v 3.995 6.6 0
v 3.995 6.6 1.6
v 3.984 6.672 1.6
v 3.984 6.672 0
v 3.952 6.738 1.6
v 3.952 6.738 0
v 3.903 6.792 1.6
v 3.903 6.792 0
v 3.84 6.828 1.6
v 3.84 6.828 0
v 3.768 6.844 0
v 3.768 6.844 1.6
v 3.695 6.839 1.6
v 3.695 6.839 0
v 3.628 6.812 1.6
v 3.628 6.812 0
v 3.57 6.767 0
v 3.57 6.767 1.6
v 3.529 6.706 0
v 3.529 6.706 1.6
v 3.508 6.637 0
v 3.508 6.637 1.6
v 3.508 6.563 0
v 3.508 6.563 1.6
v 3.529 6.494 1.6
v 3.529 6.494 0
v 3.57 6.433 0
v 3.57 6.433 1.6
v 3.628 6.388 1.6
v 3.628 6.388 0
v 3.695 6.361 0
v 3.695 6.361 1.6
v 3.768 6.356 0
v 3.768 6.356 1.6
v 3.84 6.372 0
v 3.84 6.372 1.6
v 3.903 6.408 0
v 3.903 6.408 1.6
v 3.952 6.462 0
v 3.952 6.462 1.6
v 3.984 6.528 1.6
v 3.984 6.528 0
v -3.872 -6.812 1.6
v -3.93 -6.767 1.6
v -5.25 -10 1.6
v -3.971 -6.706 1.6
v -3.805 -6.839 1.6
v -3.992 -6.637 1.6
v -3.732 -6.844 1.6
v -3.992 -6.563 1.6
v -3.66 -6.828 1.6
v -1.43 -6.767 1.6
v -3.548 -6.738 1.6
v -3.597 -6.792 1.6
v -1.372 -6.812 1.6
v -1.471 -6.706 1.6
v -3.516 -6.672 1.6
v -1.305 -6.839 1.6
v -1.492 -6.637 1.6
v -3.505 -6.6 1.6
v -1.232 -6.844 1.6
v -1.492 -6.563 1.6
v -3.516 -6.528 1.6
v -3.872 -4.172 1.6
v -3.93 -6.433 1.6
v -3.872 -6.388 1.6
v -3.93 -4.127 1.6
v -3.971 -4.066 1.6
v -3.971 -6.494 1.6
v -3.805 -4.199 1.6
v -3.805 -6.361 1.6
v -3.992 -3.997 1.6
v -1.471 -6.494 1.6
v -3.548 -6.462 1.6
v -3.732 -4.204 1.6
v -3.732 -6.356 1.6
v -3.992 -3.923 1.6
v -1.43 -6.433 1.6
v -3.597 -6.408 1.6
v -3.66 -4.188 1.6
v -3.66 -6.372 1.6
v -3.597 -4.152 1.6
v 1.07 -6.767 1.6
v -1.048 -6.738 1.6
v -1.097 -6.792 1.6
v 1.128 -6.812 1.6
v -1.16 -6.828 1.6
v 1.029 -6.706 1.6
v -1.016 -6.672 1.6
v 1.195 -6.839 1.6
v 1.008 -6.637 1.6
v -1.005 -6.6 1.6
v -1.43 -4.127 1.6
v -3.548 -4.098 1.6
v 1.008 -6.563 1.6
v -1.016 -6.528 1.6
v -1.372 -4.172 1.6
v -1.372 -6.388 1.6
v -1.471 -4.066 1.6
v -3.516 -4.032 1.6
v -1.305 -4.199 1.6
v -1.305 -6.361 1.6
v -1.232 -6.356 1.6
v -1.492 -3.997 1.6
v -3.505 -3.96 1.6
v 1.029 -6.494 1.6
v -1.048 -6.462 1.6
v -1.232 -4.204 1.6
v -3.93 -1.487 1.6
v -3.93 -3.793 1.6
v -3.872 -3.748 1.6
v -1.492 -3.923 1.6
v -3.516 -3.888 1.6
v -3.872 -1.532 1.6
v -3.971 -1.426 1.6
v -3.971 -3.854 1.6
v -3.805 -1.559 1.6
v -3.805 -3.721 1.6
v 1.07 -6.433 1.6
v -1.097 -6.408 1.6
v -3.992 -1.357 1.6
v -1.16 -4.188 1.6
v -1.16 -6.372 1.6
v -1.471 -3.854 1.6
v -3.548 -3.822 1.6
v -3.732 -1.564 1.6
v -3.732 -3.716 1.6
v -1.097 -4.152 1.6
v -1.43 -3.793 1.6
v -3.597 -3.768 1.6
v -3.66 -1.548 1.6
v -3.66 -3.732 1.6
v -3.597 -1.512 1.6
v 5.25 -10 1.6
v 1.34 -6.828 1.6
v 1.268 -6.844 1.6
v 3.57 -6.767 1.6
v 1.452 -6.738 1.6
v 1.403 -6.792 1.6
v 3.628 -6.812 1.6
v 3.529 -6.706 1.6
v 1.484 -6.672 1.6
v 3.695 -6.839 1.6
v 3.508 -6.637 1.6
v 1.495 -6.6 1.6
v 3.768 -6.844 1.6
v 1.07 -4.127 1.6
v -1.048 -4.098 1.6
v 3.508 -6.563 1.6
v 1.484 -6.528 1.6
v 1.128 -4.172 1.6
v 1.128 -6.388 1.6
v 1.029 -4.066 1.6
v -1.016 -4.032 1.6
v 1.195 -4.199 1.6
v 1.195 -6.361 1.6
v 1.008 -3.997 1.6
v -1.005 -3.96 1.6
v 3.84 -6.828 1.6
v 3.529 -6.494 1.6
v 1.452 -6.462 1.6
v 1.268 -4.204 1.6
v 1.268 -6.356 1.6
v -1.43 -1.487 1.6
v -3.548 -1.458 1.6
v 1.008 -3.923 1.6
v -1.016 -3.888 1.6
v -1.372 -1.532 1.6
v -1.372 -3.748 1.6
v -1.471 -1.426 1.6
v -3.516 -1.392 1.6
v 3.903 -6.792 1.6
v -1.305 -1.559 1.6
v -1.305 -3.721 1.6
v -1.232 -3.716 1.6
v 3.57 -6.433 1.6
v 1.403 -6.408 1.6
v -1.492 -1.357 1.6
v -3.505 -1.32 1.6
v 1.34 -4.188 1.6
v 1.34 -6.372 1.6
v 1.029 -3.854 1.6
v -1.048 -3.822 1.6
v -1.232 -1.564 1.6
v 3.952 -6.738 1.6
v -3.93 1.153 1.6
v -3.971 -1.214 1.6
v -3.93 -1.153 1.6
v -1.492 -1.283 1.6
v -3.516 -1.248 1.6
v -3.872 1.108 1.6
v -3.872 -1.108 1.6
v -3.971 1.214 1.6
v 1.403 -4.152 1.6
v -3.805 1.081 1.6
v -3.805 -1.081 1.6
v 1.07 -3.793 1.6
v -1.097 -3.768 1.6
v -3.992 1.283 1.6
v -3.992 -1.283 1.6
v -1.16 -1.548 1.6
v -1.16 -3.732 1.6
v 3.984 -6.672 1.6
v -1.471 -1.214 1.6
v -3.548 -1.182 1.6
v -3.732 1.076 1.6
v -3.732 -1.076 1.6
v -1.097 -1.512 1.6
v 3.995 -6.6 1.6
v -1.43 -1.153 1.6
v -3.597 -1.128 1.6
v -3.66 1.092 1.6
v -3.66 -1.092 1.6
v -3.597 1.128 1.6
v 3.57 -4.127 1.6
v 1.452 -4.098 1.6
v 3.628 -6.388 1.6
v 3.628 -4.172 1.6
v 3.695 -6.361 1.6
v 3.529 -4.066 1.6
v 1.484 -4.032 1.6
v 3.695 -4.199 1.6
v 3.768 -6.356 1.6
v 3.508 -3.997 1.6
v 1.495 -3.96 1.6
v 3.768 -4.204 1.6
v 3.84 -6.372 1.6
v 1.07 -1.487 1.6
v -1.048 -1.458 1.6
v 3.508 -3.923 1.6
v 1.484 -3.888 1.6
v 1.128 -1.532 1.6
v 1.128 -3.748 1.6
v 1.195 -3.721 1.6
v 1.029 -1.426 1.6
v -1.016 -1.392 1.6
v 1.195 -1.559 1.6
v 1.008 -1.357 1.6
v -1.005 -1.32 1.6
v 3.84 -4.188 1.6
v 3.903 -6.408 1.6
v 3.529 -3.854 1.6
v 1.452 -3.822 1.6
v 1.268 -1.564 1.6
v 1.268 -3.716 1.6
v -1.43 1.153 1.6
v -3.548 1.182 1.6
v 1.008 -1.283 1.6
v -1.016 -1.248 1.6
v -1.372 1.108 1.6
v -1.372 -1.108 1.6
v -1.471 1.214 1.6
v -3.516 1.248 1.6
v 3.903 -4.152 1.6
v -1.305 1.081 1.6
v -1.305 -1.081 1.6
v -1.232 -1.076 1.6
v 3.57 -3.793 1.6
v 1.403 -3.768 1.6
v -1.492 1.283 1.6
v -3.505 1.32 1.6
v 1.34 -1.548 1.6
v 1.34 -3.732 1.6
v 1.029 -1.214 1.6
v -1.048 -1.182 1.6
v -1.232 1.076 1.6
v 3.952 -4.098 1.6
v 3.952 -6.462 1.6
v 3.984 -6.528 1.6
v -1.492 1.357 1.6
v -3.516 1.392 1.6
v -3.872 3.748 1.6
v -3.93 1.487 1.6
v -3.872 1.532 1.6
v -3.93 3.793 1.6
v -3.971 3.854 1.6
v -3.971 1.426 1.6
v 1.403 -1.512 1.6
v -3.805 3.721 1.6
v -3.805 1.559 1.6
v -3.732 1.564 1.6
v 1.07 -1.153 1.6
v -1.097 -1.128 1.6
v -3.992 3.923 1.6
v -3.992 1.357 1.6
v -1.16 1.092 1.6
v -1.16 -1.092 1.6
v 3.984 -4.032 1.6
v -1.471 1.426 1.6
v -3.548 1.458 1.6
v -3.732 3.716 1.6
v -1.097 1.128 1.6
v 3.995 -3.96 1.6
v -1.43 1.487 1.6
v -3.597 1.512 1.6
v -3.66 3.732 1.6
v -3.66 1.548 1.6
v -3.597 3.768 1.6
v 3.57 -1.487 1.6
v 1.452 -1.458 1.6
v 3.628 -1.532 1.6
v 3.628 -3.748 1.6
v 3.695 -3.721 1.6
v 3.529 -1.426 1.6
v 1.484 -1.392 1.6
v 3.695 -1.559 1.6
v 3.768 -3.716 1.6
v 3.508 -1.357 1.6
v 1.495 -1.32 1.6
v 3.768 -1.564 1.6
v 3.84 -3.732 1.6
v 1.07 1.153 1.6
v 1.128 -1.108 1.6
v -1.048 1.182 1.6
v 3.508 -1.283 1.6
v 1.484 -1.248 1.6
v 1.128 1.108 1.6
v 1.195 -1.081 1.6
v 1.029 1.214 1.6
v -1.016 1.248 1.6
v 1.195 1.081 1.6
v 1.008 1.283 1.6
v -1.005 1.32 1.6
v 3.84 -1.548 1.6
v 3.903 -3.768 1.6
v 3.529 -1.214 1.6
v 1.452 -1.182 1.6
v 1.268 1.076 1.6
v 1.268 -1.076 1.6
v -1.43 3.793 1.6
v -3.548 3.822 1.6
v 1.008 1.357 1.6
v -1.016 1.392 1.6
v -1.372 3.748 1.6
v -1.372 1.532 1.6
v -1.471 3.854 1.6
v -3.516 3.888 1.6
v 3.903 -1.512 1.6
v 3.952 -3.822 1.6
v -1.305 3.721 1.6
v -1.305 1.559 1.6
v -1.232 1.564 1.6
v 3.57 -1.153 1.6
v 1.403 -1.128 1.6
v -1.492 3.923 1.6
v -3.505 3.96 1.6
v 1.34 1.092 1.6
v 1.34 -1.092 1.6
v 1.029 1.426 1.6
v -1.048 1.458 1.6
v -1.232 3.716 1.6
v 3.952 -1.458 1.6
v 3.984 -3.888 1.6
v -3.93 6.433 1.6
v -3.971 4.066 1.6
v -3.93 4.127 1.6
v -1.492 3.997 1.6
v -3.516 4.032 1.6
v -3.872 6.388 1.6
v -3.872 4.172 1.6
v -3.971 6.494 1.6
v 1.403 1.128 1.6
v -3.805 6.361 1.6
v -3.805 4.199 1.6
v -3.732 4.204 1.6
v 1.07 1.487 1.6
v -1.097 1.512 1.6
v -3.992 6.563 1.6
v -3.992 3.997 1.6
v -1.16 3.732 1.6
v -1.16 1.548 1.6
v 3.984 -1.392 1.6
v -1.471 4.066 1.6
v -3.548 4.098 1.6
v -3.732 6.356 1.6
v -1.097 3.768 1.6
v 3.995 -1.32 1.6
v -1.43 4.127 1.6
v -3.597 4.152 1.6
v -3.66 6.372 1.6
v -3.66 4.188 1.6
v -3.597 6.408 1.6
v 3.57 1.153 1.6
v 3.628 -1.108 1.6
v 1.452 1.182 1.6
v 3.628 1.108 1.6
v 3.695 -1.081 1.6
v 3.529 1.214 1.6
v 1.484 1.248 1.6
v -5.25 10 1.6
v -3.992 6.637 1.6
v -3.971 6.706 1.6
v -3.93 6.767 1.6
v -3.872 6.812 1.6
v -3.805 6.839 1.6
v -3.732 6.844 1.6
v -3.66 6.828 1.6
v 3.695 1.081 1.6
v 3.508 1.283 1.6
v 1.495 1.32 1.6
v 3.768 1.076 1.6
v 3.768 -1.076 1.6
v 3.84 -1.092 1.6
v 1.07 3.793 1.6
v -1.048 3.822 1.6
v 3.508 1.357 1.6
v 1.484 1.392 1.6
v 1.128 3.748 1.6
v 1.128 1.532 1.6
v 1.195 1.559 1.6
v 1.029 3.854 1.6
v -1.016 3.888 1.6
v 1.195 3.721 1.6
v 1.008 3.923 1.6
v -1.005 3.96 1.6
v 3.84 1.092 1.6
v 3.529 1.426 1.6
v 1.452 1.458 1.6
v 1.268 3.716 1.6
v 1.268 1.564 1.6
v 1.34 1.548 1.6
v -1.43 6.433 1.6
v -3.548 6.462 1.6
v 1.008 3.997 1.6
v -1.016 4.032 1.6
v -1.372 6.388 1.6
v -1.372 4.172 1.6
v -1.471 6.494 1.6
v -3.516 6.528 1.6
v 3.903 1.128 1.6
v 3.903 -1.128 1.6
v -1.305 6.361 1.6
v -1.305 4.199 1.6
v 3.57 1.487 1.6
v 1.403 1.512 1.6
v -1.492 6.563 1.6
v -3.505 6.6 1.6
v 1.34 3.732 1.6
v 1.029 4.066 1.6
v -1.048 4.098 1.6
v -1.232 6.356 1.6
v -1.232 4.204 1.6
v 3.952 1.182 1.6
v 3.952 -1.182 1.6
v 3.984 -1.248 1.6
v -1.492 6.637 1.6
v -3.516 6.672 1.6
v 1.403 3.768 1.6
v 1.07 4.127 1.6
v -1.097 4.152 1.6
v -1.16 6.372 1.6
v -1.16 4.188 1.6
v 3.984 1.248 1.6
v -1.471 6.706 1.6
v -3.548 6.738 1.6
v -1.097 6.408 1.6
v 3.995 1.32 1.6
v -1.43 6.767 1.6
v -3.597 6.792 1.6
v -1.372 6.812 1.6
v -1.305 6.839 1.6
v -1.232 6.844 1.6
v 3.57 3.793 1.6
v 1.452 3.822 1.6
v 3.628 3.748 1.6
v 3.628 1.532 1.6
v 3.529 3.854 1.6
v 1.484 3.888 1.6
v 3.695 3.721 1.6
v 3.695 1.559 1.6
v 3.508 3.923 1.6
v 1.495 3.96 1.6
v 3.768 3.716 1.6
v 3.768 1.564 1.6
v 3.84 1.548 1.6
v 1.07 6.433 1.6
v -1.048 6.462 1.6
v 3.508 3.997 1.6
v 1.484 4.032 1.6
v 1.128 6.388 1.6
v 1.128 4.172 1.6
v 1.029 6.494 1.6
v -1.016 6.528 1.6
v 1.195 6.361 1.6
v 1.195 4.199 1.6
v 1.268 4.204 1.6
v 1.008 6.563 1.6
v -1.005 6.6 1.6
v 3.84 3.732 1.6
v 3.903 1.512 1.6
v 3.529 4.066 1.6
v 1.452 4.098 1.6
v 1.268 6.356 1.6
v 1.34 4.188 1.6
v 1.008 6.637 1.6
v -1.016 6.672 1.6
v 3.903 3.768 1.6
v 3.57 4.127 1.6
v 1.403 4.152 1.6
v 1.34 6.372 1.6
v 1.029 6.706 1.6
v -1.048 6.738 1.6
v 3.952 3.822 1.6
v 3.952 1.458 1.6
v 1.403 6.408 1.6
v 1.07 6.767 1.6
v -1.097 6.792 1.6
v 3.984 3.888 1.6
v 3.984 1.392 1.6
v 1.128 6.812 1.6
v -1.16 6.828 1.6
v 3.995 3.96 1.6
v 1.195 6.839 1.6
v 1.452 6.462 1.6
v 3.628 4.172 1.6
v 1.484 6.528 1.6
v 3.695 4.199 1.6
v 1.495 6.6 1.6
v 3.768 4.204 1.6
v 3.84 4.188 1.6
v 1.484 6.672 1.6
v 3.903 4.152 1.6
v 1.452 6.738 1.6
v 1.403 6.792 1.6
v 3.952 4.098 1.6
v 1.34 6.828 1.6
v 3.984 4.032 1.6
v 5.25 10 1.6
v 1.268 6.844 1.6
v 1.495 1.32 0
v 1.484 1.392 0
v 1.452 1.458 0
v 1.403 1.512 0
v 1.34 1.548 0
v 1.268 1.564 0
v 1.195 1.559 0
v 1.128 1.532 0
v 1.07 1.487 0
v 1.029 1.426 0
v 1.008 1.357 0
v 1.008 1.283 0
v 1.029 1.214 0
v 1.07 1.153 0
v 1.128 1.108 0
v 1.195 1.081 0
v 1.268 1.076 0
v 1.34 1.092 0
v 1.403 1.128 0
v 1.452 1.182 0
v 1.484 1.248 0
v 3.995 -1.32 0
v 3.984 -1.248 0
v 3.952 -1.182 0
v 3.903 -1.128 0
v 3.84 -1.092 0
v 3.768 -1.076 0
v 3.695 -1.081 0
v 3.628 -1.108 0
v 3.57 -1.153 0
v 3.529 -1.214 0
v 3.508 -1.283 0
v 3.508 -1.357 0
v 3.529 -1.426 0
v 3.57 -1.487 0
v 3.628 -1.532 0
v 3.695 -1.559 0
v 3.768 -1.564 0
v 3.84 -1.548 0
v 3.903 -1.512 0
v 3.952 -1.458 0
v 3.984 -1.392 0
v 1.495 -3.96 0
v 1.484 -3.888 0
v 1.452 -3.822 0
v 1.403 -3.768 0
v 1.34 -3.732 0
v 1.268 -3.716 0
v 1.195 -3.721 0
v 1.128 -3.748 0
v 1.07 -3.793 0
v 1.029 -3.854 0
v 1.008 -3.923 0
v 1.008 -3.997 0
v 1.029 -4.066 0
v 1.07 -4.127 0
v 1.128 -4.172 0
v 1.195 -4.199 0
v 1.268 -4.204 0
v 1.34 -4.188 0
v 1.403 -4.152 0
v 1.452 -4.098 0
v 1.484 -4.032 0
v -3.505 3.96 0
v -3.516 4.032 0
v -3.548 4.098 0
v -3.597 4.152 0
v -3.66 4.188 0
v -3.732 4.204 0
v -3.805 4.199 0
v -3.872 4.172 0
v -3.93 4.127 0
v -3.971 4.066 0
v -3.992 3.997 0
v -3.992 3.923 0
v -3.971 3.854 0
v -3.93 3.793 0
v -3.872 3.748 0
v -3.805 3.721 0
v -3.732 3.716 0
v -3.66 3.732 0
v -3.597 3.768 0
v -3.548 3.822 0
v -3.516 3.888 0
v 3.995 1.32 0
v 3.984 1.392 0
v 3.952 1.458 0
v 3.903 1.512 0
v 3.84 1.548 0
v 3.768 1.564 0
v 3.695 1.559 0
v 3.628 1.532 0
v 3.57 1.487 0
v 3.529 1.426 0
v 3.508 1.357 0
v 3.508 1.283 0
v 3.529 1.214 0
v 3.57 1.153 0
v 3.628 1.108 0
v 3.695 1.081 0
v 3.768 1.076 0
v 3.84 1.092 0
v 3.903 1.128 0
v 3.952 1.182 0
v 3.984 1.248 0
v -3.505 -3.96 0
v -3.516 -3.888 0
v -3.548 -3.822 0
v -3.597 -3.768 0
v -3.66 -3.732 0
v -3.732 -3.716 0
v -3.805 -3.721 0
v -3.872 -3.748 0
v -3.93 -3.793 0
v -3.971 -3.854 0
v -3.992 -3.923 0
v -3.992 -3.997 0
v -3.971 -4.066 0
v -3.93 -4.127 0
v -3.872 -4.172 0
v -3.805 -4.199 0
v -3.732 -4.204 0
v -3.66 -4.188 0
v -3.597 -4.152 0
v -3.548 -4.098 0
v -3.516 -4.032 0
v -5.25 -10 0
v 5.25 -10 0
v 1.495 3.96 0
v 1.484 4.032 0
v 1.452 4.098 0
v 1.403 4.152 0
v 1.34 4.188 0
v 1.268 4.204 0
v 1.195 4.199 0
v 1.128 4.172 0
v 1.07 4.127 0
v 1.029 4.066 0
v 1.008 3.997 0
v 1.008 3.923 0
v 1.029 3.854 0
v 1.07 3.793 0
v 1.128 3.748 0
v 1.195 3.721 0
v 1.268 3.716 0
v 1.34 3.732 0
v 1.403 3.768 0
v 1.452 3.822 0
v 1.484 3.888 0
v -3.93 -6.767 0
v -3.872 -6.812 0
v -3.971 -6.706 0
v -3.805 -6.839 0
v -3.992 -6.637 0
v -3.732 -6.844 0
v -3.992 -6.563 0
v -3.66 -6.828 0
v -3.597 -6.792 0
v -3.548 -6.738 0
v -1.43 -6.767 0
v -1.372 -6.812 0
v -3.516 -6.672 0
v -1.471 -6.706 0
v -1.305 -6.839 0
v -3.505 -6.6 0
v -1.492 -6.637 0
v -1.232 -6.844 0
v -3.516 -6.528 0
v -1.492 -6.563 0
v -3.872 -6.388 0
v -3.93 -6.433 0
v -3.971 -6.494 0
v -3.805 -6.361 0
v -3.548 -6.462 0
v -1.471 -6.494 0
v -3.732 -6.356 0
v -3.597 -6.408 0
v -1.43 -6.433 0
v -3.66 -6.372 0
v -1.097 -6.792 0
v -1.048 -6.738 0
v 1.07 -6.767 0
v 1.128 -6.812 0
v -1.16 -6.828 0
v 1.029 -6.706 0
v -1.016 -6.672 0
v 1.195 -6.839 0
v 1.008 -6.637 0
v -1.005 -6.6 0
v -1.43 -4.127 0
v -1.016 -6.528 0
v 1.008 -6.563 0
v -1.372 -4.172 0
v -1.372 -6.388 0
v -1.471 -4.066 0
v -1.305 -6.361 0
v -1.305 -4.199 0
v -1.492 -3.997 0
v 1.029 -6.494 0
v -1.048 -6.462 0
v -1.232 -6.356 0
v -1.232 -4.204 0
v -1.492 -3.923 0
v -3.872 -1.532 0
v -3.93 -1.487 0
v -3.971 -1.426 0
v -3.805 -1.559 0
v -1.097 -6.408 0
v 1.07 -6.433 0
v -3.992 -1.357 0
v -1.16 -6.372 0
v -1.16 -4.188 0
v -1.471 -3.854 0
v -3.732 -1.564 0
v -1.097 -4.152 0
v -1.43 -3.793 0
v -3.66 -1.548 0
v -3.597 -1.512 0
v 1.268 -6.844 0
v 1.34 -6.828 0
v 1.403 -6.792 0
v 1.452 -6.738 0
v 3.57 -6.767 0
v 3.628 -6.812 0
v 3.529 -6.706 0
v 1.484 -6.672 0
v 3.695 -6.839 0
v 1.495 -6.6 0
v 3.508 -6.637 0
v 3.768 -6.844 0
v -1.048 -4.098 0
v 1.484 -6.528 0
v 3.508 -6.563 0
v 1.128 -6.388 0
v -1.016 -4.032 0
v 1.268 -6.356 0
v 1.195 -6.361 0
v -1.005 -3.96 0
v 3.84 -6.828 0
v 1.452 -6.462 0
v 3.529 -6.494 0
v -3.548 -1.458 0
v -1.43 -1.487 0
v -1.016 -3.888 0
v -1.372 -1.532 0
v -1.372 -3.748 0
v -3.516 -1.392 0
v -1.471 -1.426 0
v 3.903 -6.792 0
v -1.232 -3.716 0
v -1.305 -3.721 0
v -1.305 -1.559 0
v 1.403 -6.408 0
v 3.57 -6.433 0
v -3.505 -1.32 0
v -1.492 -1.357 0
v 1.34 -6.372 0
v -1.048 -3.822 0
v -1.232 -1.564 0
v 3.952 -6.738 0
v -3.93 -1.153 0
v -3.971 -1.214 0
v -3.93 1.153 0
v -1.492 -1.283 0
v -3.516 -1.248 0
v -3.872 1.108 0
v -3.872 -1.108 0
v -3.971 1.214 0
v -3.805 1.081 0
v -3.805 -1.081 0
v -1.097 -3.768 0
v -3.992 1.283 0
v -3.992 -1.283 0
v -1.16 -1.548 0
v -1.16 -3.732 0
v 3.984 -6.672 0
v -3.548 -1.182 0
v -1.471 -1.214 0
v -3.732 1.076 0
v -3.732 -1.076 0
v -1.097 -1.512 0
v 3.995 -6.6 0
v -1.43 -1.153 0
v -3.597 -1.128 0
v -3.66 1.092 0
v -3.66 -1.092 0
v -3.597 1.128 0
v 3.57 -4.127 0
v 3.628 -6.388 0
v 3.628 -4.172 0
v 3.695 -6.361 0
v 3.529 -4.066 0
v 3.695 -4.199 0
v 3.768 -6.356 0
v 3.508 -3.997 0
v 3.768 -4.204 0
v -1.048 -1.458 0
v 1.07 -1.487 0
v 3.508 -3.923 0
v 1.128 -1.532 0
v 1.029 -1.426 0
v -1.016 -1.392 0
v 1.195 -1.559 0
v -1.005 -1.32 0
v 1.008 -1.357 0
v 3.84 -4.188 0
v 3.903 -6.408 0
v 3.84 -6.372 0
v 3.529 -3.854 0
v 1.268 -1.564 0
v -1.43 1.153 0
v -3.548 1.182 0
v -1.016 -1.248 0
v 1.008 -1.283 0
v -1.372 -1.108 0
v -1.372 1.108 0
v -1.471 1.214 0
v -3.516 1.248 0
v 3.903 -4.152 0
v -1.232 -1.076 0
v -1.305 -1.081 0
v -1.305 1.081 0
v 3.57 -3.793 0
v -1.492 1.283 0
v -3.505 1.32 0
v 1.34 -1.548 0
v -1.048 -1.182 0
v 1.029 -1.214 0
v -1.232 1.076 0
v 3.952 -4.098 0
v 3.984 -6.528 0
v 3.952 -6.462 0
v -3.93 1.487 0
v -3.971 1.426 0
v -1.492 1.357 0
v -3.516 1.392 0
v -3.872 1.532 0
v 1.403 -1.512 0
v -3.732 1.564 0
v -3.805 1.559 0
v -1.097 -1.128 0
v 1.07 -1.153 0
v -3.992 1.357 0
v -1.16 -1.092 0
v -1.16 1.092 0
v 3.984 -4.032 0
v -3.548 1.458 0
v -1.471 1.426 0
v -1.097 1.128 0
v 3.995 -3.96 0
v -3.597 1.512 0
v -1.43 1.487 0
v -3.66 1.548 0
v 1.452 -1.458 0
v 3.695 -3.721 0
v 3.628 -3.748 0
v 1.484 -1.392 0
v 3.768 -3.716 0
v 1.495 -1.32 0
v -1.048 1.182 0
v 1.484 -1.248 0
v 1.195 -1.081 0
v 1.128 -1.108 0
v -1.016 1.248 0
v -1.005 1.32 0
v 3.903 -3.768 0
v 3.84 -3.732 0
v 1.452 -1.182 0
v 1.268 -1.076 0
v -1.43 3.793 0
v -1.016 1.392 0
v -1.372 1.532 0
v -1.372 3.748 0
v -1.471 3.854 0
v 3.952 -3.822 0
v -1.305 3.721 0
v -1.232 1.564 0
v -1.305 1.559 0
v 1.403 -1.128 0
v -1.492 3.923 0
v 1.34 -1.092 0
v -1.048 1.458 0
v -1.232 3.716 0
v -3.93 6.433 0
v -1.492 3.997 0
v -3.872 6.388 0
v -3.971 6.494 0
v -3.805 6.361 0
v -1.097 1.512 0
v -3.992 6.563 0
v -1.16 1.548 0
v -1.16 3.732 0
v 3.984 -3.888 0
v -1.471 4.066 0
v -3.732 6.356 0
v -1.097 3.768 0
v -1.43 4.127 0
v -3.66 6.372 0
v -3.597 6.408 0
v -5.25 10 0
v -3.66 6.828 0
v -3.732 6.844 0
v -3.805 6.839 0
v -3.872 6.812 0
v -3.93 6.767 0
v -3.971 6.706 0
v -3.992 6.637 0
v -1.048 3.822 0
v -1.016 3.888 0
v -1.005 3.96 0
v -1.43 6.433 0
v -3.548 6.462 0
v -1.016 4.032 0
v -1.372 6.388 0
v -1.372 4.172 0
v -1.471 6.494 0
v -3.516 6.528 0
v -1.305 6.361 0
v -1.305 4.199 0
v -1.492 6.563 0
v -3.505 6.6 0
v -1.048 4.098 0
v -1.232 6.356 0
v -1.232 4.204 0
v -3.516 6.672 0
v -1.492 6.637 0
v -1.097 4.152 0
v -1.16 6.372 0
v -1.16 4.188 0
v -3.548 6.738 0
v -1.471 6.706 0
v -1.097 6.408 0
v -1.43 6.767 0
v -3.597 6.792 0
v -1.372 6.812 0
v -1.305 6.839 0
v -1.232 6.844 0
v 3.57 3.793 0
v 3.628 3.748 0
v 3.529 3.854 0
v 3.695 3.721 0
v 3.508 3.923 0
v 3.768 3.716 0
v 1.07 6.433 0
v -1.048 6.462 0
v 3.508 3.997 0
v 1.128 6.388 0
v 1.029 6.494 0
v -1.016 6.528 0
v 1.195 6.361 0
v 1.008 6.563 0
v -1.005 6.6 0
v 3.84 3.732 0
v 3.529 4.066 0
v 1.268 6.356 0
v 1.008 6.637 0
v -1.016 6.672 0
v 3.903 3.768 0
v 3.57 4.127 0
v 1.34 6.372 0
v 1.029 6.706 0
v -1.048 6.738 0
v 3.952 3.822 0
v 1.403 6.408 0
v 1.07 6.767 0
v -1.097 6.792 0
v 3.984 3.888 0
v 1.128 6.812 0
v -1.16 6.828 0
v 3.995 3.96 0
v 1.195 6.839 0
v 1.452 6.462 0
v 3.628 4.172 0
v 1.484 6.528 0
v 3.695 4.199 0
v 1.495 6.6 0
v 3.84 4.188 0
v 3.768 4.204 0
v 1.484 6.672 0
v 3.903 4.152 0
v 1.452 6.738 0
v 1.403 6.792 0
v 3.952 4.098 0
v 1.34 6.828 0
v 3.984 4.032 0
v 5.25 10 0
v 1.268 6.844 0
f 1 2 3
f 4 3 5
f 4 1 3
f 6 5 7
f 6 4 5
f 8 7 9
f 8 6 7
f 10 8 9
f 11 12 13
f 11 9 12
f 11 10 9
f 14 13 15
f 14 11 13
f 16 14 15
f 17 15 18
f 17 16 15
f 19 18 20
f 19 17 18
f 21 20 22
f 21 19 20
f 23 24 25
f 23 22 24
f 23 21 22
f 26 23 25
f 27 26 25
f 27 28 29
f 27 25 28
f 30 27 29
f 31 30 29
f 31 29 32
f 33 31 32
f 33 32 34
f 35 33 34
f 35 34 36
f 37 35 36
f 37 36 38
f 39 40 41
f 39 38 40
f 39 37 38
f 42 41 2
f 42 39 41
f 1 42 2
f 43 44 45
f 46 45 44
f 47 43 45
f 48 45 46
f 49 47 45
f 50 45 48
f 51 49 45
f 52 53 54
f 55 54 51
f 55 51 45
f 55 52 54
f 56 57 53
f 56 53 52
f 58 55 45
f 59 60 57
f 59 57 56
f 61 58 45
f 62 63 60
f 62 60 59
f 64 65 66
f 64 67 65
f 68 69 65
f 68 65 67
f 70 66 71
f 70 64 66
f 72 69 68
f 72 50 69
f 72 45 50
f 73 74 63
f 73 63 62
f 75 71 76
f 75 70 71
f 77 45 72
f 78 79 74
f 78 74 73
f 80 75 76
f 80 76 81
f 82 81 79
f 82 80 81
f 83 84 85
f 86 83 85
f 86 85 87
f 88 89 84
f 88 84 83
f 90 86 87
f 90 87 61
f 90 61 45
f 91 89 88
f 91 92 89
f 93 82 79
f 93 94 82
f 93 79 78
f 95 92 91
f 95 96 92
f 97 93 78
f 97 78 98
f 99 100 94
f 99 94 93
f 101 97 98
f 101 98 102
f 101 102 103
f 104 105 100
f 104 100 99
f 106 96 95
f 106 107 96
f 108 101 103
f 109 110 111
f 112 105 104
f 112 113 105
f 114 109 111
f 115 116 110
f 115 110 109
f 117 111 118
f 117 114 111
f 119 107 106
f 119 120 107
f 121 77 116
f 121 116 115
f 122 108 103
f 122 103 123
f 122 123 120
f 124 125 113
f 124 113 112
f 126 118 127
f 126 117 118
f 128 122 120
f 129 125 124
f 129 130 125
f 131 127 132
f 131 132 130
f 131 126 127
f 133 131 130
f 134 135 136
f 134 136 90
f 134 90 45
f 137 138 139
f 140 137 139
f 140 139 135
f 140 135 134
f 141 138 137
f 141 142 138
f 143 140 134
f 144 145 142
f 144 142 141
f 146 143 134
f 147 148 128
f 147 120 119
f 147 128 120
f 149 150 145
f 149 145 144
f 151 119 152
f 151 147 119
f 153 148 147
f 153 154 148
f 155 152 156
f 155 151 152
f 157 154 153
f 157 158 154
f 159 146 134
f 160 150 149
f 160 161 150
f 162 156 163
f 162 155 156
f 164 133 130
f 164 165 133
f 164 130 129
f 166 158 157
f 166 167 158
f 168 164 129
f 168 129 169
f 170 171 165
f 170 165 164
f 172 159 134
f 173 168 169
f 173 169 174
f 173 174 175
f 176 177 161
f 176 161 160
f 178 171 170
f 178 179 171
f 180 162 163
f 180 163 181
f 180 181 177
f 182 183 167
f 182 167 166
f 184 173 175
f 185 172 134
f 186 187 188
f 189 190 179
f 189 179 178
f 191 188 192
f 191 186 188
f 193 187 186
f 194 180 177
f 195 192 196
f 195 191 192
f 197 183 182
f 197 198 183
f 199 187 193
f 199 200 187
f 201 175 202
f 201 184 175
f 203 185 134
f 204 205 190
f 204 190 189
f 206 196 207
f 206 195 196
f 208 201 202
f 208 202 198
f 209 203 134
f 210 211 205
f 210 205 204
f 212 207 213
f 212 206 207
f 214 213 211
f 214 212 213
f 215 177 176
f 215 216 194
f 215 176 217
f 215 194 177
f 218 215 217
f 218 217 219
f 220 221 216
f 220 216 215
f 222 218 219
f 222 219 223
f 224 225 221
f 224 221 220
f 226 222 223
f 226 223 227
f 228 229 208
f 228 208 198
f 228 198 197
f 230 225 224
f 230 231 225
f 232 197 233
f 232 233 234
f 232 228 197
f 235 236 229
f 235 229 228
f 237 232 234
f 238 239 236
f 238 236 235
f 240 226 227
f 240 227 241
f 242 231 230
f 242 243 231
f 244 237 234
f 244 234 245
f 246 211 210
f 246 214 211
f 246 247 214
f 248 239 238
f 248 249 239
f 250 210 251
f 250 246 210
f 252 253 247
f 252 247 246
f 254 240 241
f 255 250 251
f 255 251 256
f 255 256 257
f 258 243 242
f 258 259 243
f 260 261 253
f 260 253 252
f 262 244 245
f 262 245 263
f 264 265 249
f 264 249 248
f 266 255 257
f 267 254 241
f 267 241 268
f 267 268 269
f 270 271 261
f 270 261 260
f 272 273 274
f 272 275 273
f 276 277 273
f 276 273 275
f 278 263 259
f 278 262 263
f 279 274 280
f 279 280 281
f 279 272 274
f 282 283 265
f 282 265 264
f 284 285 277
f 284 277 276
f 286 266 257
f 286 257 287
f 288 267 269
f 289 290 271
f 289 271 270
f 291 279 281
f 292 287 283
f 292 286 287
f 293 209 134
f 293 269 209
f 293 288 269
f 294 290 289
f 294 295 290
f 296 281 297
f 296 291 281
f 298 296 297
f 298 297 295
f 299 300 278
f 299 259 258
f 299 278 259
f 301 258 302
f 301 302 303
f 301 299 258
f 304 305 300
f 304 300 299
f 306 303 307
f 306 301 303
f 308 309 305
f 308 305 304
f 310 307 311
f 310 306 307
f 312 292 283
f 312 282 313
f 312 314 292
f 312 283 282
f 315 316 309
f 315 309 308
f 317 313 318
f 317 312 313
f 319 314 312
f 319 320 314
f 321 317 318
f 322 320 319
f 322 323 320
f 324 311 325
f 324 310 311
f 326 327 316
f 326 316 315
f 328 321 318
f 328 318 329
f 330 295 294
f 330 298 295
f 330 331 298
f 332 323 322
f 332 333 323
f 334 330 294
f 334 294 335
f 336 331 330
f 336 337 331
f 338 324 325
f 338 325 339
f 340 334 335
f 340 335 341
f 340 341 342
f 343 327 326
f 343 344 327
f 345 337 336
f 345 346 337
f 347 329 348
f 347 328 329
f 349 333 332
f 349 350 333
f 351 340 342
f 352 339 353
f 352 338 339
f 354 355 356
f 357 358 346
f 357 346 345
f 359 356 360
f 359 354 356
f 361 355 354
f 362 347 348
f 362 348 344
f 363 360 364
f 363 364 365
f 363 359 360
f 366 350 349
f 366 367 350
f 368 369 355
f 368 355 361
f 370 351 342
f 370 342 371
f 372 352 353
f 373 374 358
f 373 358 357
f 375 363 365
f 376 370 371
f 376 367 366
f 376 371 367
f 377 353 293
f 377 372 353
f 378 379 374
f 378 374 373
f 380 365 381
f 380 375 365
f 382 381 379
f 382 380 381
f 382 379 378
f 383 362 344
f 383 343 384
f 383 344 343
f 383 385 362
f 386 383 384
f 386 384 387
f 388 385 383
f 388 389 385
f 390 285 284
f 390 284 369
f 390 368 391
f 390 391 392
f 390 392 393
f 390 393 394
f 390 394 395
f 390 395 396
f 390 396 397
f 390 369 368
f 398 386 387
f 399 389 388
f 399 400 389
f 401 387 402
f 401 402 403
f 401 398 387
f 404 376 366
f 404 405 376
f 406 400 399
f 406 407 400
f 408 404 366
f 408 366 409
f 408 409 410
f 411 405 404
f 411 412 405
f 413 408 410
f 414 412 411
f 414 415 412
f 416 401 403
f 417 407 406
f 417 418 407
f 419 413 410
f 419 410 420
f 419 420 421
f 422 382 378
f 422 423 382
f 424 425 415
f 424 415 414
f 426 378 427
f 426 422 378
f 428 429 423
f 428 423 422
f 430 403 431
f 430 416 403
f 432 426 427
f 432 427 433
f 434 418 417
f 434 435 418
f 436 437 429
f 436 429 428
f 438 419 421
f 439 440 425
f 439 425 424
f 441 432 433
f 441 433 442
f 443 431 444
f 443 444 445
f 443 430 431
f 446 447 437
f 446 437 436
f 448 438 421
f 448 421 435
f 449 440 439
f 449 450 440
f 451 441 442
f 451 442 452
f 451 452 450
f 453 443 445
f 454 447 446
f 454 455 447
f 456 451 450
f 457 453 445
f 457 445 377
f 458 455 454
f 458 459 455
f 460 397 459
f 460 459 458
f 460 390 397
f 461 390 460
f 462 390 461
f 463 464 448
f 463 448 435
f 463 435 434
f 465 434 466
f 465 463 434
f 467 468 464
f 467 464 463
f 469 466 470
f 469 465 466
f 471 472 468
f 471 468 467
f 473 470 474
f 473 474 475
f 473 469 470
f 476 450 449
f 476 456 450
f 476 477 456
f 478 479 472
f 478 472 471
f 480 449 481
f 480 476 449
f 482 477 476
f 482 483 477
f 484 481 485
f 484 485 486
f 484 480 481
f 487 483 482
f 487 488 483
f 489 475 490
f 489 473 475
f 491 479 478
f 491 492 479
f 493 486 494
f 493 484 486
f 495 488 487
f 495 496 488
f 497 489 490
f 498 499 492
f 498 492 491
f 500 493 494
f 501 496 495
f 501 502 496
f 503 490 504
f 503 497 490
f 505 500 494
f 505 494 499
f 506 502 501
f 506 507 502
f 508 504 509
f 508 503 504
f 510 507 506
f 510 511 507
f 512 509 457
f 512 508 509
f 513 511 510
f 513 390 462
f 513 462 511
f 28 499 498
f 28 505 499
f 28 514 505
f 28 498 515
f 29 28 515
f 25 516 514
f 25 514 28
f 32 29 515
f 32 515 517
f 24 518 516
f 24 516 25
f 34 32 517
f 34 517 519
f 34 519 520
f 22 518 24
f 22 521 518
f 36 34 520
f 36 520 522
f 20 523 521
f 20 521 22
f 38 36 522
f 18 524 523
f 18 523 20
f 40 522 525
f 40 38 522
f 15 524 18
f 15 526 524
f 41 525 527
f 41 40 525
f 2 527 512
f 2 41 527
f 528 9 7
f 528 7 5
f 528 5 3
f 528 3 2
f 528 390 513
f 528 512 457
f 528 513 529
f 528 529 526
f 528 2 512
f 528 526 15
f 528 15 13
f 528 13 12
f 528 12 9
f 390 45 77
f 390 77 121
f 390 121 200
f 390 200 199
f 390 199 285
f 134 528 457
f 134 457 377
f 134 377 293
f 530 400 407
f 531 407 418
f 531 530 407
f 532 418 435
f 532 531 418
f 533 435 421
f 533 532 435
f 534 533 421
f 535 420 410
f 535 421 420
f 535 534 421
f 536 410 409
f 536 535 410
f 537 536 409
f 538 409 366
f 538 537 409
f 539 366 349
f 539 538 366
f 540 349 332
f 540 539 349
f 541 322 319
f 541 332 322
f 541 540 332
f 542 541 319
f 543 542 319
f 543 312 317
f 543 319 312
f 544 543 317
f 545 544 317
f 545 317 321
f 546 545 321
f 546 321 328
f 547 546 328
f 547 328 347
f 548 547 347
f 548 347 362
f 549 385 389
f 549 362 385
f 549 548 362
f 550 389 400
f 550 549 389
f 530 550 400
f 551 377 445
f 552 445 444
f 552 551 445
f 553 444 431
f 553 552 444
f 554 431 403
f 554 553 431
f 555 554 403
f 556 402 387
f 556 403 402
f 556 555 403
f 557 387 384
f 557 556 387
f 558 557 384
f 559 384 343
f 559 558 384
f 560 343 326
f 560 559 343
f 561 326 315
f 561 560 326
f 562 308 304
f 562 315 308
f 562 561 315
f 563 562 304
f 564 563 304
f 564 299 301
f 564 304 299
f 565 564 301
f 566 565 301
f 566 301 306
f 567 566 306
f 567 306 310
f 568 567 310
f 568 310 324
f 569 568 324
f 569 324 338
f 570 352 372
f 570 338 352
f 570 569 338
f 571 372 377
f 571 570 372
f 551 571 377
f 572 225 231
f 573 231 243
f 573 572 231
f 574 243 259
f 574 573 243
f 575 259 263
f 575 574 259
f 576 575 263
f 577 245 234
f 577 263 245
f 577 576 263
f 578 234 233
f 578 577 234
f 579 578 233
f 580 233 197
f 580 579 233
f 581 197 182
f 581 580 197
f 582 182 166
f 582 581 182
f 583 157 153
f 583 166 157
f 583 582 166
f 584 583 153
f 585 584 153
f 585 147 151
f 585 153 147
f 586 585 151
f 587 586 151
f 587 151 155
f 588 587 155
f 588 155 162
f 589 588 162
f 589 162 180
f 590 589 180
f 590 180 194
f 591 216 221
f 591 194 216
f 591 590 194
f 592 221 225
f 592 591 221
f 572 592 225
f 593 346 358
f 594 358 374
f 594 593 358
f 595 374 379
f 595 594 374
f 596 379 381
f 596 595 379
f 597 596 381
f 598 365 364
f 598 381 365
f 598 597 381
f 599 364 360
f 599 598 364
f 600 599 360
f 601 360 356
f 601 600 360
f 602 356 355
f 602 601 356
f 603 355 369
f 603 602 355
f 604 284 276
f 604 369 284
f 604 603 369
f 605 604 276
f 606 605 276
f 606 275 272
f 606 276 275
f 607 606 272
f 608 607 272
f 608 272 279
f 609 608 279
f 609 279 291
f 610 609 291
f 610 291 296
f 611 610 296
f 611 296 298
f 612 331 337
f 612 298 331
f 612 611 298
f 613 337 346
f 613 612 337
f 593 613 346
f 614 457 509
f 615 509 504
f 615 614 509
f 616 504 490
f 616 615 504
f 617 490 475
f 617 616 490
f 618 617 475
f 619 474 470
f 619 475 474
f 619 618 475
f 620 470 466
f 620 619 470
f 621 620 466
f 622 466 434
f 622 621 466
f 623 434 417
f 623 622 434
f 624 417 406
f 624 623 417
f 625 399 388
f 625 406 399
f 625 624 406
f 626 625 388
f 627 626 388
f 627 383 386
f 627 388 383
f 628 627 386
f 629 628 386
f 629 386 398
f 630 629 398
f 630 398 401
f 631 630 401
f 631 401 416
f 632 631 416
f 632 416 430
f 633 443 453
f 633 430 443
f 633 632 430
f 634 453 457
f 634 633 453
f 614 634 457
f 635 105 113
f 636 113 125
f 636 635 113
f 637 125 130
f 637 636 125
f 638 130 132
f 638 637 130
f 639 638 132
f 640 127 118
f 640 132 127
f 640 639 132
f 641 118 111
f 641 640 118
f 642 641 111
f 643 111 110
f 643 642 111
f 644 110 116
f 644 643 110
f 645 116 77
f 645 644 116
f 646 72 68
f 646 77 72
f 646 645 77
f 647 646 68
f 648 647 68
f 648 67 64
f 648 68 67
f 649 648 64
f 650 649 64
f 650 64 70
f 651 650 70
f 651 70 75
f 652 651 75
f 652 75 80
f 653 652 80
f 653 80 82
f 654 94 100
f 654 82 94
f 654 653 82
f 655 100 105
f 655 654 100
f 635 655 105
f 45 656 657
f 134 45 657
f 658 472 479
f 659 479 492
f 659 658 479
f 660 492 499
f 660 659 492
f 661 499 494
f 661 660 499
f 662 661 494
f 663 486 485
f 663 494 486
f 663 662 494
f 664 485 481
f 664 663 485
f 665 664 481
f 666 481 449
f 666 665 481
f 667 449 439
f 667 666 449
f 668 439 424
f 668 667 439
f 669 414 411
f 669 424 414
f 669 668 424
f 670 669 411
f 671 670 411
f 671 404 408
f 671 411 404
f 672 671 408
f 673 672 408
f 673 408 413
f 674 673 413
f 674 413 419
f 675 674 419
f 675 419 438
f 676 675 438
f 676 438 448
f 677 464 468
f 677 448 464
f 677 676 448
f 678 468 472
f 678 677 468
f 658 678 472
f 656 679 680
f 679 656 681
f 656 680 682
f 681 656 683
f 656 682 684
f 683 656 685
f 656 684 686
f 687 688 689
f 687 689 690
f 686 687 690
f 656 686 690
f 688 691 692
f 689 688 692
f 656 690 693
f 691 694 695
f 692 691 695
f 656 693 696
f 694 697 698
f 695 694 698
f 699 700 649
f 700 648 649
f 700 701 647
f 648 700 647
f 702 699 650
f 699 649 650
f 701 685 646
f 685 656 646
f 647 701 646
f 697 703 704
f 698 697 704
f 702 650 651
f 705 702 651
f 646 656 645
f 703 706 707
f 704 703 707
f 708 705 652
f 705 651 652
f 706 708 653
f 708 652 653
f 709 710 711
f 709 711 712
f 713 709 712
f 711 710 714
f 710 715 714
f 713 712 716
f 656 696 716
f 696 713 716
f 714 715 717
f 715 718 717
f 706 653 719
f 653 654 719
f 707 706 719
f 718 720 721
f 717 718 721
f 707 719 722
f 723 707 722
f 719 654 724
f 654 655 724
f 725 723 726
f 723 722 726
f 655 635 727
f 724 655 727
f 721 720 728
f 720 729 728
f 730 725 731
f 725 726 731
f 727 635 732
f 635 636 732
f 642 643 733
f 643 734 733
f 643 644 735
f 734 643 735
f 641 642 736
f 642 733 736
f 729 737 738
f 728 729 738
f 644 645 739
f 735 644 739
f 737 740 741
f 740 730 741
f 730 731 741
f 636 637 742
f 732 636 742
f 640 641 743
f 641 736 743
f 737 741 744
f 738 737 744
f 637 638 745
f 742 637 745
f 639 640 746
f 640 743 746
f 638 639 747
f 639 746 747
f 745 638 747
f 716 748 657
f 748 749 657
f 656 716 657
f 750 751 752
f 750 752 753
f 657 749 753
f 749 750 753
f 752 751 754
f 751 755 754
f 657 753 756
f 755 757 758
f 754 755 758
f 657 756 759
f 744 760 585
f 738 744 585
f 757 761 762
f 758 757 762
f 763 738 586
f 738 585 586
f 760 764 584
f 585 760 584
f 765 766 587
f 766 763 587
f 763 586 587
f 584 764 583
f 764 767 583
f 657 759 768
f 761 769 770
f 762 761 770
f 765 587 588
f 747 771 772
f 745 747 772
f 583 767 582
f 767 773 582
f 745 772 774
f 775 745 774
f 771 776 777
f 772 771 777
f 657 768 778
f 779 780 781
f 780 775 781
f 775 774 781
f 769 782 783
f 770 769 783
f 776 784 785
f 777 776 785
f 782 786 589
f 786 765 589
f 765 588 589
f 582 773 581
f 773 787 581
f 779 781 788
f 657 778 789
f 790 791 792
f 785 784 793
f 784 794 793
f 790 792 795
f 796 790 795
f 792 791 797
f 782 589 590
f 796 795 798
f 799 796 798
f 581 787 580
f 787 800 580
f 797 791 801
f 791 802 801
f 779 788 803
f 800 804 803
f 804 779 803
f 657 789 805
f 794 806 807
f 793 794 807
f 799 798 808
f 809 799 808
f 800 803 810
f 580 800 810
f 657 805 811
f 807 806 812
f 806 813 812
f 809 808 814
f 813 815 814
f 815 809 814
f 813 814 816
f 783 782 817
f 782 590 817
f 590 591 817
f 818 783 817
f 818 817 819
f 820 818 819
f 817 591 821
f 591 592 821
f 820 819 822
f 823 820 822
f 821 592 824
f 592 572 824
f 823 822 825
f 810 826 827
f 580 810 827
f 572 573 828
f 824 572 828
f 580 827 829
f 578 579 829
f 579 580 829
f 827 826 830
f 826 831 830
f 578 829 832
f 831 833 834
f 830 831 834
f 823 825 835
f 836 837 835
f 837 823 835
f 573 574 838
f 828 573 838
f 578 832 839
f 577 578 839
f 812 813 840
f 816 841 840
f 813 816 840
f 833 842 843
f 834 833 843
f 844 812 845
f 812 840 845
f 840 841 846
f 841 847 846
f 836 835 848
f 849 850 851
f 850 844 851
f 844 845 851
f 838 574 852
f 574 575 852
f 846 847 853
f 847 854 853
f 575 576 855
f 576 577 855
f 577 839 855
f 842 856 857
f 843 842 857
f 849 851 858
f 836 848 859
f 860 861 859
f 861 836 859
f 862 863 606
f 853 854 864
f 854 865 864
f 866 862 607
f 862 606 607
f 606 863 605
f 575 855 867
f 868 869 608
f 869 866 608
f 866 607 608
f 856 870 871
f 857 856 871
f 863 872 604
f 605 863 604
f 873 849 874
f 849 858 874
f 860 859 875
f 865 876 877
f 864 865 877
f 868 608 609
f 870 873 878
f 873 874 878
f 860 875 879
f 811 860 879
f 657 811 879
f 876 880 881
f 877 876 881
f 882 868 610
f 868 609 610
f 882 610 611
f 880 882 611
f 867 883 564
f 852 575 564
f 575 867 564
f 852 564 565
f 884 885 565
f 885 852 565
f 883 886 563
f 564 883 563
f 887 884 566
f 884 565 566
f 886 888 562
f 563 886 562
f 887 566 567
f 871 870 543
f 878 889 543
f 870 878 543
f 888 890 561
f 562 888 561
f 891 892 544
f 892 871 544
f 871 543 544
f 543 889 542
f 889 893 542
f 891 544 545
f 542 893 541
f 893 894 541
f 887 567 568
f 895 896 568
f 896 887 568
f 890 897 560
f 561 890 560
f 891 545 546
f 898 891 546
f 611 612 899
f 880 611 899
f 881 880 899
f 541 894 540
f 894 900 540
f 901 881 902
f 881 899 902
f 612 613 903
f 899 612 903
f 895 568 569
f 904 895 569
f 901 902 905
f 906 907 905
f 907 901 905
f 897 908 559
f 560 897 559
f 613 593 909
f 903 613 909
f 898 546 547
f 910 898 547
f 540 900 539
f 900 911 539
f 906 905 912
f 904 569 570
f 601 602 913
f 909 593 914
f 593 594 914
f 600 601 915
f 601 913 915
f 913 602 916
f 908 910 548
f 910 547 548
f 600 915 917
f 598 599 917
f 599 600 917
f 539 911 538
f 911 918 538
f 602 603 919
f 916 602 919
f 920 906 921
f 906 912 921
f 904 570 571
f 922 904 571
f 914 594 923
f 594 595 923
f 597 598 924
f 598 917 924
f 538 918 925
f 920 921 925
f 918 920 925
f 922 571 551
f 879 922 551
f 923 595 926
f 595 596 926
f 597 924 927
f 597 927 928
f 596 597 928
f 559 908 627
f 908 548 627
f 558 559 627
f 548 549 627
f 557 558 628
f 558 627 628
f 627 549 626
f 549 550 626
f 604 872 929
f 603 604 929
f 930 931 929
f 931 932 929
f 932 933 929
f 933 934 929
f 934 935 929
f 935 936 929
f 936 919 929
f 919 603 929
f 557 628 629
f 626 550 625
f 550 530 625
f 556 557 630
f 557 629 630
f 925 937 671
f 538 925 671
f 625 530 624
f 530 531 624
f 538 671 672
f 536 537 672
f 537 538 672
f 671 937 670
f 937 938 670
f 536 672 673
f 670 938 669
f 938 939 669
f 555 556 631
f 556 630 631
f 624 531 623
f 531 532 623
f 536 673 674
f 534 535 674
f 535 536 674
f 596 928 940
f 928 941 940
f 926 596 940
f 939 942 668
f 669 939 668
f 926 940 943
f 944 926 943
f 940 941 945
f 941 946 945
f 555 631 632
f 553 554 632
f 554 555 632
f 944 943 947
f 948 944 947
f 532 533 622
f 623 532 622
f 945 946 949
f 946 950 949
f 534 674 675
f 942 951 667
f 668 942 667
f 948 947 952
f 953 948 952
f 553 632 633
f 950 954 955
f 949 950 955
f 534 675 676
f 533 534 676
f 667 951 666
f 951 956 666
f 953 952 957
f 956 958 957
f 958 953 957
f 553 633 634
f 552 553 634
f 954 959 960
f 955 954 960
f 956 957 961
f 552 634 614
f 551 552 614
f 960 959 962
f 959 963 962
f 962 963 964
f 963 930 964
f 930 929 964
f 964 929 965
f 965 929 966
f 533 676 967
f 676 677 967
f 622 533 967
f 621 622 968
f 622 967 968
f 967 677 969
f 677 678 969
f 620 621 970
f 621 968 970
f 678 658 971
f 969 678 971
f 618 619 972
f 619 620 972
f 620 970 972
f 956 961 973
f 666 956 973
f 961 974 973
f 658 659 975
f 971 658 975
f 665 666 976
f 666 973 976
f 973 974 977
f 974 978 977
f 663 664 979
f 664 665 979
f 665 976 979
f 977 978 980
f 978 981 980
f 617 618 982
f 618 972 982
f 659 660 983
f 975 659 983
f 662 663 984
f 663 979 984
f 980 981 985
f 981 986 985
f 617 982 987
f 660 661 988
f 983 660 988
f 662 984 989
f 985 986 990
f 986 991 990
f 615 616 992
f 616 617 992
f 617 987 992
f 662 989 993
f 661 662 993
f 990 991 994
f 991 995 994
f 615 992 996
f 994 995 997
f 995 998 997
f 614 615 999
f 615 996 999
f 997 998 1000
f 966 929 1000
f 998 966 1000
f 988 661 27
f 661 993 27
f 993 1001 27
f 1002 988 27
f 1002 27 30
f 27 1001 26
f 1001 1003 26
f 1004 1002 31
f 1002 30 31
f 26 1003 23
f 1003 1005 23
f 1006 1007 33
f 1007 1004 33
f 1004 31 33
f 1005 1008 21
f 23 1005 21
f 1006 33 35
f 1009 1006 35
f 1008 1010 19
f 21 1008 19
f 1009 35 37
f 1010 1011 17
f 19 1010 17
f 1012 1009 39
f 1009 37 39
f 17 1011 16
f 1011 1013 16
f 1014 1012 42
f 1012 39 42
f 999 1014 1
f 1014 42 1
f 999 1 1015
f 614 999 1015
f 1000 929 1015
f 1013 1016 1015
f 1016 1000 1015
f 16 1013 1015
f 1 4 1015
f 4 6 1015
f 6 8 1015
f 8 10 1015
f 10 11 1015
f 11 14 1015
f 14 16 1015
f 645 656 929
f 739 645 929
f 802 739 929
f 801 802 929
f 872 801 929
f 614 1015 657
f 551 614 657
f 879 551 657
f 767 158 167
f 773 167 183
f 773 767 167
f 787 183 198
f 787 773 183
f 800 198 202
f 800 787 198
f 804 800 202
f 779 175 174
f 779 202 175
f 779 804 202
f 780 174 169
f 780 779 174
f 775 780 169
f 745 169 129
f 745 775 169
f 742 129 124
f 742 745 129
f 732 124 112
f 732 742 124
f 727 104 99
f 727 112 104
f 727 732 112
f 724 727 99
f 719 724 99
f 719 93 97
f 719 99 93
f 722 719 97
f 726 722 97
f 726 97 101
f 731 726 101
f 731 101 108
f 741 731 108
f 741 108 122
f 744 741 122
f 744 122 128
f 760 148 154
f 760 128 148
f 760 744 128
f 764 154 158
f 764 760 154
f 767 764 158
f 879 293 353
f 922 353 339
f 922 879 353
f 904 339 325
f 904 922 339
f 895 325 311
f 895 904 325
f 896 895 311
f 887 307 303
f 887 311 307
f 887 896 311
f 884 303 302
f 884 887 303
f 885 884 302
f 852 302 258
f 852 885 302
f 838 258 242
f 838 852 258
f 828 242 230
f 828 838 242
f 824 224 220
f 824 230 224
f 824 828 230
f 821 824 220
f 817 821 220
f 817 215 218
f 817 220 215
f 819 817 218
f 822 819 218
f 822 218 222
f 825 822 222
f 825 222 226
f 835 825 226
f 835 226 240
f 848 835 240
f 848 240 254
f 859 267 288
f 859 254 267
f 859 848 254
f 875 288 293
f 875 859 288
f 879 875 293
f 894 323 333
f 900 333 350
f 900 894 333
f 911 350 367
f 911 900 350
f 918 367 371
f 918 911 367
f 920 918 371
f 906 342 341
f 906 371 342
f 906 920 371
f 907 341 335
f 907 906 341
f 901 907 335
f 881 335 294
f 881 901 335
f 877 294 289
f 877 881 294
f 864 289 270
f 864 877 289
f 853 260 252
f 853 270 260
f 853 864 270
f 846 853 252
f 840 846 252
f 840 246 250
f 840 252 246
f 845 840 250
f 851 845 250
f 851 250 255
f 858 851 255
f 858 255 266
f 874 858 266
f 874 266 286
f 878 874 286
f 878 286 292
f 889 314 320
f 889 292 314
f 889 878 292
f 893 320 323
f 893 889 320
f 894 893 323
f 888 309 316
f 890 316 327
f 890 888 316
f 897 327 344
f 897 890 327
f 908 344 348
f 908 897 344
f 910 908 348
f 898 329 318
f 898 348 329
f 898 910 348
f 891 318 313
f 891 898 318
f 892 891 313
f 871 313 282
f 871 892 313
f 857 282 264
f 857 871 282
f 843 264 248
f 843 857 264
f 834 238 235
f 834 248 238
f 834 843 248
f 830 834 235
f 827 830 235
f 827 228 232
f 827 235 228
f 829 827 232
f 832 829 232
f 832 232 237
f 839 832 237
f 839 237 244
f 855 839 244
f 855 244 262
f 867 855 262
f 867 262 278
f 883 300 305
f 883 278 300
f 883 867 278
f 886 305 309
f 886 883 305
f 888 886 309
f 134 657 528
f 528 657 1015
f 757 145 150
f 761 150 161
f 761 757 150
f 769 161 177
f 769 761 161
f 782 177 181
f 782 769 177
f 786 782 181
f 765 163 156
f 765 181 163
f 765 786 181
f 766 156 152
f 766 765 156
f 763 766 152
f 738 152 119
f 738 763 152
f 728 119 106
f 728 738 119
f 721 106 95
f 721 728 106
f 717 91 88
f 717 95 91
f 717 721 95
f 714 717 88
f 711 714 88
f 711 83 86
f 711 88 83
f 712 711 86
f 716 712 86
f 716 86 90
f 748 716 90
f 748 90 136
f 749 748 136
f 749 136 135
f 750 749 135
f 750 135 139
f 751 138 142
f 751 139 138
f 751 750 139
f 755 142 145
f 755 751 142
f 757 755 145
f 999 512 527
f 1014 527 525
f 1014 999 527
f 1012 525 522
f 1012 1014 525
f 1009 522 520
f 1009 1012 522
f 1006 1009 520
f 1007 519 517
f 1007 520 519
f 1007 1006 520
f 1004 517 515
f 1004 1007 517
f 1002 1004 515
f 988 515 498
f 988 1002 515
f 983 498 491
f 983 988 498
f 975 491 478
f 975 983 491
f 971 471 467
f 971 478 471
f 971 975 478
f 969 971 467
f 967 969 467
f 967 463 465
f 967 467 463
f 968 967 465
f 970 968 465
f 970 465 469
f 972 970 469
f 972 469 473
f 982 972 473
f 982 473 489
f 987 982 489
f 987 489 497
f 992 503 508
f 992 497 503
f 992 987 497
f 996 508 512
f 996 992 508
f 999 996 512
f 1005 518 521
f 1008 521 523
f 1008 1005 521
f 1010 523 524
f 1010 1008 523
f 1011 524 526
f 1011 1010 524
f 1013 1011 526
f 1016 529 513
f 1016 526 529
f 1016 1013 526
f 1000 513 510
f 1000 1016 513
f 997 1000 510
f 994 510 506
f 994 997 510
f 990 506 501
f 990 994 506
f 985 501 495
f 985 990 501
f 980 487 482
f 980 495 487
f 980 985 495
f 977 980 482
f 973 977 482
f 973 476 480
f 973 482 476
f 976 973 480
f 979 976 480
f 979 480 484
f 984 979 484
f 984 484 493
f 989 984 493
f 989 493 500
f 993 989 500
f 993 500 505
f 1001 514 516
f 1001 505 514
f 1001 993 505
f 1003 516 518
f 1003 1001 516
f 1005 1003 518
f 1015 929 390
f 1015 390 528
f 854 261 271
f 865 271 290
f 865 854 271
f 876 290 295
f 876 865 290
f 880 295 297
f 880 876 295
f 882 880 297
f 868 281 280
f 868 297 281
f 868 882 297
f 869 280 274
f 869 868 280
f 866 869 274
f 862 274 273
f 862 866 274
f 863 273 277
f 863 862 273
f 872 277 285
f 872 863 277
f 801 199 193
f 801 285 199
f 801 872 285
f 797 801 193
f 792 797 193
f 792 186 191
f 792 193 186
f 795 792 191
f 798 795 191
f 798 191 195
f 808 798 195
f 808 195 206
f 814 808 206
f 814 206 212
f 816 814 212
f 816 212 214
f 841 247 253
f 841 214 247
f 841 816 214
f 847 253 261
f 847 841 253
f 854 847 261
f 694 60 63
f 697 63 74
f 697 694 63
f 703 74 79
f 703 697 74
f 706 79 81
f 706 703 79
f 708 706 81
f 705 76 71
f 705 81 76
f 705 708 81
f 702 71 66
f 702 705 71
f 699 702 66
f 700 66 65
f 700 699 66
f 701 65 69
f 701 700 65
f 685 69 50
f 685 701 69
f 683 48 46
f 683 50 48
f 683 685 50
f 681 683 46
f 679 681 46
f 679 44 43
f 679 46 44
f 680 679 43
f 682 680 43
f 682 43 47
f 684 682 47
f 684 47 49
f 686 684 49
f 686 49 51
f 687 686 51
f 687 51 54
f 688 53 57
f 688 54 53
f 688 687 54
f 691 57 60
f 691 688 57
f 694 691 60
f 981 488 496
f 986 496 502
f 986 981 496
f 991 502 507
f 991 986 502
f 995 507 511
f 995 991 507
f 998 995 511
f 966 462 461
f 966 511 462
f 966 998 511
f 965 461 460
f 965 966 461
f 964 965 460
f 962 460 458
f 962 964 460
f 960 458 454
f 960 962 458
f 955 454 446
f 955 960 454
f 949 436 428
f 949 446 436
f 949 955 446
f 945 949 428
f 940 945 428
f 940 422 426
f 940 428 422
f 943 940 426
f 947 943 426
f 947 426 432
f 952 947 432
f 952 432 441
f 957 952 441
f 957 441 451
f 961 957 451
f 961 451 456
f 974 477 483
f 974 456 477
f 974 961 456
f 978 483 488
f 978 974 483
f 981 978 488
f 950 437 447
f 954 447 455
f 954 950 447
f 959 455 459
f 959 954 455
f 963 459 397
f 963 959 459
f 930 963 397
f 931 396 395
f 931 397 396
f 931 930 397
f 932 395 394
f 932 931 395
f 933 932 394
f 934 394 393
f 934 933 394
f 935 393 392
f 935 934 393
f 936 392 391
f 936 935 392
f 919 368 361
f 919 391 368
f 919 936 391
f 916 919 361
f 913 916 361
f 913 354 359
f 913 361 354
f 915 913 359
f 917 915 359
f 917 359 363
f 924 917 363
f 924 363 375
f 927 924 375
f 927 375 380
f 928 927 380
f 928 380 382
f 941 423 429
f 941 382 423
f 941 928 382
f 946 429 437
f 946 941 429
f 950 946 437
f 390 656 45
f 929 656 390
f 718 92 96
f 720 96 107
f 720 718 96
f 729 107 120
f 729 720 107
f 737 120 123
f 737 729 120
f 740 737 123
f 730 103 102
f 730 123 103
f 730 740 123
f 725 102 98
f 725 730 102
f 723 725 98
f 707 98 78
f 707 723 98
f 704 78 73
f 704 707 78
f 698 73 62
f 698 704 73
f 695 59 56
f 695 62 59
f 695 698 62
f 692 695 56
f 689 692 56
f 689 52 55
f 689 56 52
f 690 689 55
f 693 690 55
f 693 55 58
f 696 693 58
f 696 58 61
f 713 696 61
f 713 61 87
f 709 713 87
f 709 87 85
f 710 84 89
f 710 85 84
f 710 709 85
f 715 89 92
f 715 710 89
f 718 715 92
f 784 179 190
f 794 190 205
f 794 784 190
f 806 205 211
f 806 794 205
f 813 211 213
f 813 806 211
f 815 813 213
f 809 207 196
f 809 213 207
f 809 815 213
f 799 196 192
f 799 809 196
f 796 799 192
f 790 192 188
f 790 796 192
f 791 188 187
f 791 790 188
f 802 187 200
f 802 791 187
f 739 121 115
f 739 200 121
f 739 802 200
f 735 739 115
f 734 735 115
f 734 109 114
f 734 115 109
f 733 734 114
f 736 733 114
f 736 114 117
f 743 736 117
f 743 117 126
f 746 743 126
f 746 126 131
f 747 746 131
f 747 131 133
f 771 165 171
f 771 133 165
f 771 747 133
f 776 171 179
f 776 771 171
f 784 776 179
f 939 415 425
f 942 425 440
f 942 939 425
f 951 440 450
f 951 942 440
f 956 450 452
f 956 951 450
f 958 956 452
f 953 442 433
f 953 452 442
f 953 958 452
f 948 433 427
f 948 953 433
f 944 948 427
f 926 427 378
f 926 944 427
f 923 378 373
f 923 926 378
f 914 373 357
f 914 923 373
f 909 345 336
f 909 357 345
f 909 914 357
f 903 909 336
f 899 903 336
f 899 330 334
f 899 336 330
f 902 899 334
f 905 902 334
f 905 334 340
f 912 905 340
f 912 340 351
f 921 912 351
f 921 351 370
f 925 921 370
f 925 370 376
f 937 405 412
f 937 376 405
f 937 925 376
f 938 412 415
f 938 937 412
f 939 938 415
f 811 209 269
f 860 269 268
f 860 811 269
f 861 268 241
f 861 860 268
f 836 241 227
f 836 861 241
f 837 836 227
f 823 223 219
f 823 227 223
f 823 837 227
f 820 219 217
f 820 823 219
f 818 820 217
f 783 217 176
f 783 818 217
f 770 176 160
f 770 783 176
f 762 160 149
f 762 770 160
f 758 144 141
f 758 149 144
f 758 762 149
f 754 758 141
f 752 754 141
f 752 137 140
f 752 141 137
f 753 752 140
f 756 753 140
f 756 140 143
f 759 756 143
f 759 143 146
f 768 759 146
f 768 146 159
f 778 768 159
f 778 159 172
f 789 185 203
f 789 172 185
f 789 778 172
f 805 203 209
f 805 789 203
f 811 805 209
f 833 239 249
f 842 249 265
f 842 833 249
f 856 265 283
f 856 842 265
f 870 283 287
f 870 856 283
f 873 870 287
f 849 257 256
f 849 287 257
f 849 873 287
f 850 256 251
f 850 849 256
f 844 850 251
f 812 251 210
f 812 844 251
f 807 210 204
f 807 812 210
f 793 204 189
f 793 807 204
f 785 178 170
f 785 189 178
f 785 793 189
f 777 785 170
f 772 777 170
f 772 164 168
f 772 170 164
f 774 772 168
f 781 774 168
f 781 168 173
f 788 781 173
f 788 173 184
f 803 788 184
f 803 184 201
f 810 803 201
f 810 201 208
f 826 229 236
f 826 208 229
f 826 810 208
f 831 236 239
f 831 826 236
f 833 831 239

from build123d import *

# Parameters (mm, degrees)
SKETCH_W                     = 10.5
SKETCH_H                     = 20
PAD_DEPTH                    = 1.6
SKETCH001_R                  = 0.245
POCKET_DEPTH                 = 46.891617
SKETCH001_LINEARPATTERN_2_R  = 0.245
POCKET_LINEARPATTERN_2_DEPTH = 46.891617
SKETCH001_LINEARPATTERN_3_R  = 0.245
POCKET_LINEARPATTERN_3_DEPTH = 46.891617
SKETCH001_LINEARPATTERN_4_R  = 0.245
POCKET_LINEARPATTERN_4_DEPTH = 46.891617
LINEARPATTERN001_COUNT       = 6
LINEARPATTERN001_PITCH       = 2.64


with BuildPart() as part:
    # Sketch → Pad (new body)
    with BuildSketch(Plane.XY):
        Rectangle(SKETCH_W, SKETCH_H)
    extrude(amount=PAD_DEPTH)

    # Sketch001 → Pocket (cut, through all)
    with BuildSketch(Plane.XY):
        with Locations((-3.75, 6.6)):
            Circle(SKETCH001_R)
    pocket = extrude(amount=POCKET_DEPTH, mode=Mode.SUBTRACT)

    # Sketch001 LinearPattern 2 → Pocket LinearPattern 2 (cut, through all)
    with BuildSketch(Plane(origin=(2.5, 0, 0), x_dir=(1, 0, 0), z_dir=(0, 0, 1))):
        with Locations((-3.75, 6.6)):
            Circle(SKETCH001_LINEARPATTERN_2_R)
    pocket_linearpattern_2 = extrude(amount=POCKET_LINEARPATTERN_2_DEPTH, mode=Mode.SUBTRACT)

    # Sketch001 LinearPattern 3 → Pocket LinearPattern 3 (cut, through all)
    with BuildSketch(Plane(origin=(5, 0, 0), x_dir=(1, 0, 0), z_dir=(0, 0, 1))):
        with Locations((-3.75, 6.6)):
            Circle(SKETCH001_LINEARPATTERN_3_R)
    pocket_linearpattern_3 = extrude(amount=POCKET_LINEARPATTERN_3_DEPTH, mode=Mode.SUBTRACT)

    # Sketch001 LinearPattern 4 → Pocket LinearPattern 4 (cut, through all)
    with BuildSketch(Plane(origin=(7.5, 0, 0), x_dir=(1, 0, 0), z_dir=(0, 0, 1))):
        with Locations((-3.75, 6.6)):
            Circle(SKETCH001_LINEARPATTERN_4_R)
    pocket_linearpattern_4 = extrude(amount=POCKET_LINEARPATTERN_4_DEPTH, mode=Mode.SUBTRACT)

    # LinearPattern001: Pocket, Pocket LinearPattern 2, Pocket LinearPattern 3, Pocket LinearPattern 4 ×6
    with Locations(*[(0, -i * LINEARPATTERN001_PITCH, 0) for i in range(1, LINEARPATTERN001_COUNT)]):
        add(pocket, mode=Mode.SUBTRACT)
        add(pocket_linearpattern_2, mode=Mode.SUBTRACT)
        add(pocket_linearpattern_3, mode=Mode.SUBTRACT)
        add(pocket_linearpattern_4, mode=Mode.SUBTRACT)


solid = part.part
